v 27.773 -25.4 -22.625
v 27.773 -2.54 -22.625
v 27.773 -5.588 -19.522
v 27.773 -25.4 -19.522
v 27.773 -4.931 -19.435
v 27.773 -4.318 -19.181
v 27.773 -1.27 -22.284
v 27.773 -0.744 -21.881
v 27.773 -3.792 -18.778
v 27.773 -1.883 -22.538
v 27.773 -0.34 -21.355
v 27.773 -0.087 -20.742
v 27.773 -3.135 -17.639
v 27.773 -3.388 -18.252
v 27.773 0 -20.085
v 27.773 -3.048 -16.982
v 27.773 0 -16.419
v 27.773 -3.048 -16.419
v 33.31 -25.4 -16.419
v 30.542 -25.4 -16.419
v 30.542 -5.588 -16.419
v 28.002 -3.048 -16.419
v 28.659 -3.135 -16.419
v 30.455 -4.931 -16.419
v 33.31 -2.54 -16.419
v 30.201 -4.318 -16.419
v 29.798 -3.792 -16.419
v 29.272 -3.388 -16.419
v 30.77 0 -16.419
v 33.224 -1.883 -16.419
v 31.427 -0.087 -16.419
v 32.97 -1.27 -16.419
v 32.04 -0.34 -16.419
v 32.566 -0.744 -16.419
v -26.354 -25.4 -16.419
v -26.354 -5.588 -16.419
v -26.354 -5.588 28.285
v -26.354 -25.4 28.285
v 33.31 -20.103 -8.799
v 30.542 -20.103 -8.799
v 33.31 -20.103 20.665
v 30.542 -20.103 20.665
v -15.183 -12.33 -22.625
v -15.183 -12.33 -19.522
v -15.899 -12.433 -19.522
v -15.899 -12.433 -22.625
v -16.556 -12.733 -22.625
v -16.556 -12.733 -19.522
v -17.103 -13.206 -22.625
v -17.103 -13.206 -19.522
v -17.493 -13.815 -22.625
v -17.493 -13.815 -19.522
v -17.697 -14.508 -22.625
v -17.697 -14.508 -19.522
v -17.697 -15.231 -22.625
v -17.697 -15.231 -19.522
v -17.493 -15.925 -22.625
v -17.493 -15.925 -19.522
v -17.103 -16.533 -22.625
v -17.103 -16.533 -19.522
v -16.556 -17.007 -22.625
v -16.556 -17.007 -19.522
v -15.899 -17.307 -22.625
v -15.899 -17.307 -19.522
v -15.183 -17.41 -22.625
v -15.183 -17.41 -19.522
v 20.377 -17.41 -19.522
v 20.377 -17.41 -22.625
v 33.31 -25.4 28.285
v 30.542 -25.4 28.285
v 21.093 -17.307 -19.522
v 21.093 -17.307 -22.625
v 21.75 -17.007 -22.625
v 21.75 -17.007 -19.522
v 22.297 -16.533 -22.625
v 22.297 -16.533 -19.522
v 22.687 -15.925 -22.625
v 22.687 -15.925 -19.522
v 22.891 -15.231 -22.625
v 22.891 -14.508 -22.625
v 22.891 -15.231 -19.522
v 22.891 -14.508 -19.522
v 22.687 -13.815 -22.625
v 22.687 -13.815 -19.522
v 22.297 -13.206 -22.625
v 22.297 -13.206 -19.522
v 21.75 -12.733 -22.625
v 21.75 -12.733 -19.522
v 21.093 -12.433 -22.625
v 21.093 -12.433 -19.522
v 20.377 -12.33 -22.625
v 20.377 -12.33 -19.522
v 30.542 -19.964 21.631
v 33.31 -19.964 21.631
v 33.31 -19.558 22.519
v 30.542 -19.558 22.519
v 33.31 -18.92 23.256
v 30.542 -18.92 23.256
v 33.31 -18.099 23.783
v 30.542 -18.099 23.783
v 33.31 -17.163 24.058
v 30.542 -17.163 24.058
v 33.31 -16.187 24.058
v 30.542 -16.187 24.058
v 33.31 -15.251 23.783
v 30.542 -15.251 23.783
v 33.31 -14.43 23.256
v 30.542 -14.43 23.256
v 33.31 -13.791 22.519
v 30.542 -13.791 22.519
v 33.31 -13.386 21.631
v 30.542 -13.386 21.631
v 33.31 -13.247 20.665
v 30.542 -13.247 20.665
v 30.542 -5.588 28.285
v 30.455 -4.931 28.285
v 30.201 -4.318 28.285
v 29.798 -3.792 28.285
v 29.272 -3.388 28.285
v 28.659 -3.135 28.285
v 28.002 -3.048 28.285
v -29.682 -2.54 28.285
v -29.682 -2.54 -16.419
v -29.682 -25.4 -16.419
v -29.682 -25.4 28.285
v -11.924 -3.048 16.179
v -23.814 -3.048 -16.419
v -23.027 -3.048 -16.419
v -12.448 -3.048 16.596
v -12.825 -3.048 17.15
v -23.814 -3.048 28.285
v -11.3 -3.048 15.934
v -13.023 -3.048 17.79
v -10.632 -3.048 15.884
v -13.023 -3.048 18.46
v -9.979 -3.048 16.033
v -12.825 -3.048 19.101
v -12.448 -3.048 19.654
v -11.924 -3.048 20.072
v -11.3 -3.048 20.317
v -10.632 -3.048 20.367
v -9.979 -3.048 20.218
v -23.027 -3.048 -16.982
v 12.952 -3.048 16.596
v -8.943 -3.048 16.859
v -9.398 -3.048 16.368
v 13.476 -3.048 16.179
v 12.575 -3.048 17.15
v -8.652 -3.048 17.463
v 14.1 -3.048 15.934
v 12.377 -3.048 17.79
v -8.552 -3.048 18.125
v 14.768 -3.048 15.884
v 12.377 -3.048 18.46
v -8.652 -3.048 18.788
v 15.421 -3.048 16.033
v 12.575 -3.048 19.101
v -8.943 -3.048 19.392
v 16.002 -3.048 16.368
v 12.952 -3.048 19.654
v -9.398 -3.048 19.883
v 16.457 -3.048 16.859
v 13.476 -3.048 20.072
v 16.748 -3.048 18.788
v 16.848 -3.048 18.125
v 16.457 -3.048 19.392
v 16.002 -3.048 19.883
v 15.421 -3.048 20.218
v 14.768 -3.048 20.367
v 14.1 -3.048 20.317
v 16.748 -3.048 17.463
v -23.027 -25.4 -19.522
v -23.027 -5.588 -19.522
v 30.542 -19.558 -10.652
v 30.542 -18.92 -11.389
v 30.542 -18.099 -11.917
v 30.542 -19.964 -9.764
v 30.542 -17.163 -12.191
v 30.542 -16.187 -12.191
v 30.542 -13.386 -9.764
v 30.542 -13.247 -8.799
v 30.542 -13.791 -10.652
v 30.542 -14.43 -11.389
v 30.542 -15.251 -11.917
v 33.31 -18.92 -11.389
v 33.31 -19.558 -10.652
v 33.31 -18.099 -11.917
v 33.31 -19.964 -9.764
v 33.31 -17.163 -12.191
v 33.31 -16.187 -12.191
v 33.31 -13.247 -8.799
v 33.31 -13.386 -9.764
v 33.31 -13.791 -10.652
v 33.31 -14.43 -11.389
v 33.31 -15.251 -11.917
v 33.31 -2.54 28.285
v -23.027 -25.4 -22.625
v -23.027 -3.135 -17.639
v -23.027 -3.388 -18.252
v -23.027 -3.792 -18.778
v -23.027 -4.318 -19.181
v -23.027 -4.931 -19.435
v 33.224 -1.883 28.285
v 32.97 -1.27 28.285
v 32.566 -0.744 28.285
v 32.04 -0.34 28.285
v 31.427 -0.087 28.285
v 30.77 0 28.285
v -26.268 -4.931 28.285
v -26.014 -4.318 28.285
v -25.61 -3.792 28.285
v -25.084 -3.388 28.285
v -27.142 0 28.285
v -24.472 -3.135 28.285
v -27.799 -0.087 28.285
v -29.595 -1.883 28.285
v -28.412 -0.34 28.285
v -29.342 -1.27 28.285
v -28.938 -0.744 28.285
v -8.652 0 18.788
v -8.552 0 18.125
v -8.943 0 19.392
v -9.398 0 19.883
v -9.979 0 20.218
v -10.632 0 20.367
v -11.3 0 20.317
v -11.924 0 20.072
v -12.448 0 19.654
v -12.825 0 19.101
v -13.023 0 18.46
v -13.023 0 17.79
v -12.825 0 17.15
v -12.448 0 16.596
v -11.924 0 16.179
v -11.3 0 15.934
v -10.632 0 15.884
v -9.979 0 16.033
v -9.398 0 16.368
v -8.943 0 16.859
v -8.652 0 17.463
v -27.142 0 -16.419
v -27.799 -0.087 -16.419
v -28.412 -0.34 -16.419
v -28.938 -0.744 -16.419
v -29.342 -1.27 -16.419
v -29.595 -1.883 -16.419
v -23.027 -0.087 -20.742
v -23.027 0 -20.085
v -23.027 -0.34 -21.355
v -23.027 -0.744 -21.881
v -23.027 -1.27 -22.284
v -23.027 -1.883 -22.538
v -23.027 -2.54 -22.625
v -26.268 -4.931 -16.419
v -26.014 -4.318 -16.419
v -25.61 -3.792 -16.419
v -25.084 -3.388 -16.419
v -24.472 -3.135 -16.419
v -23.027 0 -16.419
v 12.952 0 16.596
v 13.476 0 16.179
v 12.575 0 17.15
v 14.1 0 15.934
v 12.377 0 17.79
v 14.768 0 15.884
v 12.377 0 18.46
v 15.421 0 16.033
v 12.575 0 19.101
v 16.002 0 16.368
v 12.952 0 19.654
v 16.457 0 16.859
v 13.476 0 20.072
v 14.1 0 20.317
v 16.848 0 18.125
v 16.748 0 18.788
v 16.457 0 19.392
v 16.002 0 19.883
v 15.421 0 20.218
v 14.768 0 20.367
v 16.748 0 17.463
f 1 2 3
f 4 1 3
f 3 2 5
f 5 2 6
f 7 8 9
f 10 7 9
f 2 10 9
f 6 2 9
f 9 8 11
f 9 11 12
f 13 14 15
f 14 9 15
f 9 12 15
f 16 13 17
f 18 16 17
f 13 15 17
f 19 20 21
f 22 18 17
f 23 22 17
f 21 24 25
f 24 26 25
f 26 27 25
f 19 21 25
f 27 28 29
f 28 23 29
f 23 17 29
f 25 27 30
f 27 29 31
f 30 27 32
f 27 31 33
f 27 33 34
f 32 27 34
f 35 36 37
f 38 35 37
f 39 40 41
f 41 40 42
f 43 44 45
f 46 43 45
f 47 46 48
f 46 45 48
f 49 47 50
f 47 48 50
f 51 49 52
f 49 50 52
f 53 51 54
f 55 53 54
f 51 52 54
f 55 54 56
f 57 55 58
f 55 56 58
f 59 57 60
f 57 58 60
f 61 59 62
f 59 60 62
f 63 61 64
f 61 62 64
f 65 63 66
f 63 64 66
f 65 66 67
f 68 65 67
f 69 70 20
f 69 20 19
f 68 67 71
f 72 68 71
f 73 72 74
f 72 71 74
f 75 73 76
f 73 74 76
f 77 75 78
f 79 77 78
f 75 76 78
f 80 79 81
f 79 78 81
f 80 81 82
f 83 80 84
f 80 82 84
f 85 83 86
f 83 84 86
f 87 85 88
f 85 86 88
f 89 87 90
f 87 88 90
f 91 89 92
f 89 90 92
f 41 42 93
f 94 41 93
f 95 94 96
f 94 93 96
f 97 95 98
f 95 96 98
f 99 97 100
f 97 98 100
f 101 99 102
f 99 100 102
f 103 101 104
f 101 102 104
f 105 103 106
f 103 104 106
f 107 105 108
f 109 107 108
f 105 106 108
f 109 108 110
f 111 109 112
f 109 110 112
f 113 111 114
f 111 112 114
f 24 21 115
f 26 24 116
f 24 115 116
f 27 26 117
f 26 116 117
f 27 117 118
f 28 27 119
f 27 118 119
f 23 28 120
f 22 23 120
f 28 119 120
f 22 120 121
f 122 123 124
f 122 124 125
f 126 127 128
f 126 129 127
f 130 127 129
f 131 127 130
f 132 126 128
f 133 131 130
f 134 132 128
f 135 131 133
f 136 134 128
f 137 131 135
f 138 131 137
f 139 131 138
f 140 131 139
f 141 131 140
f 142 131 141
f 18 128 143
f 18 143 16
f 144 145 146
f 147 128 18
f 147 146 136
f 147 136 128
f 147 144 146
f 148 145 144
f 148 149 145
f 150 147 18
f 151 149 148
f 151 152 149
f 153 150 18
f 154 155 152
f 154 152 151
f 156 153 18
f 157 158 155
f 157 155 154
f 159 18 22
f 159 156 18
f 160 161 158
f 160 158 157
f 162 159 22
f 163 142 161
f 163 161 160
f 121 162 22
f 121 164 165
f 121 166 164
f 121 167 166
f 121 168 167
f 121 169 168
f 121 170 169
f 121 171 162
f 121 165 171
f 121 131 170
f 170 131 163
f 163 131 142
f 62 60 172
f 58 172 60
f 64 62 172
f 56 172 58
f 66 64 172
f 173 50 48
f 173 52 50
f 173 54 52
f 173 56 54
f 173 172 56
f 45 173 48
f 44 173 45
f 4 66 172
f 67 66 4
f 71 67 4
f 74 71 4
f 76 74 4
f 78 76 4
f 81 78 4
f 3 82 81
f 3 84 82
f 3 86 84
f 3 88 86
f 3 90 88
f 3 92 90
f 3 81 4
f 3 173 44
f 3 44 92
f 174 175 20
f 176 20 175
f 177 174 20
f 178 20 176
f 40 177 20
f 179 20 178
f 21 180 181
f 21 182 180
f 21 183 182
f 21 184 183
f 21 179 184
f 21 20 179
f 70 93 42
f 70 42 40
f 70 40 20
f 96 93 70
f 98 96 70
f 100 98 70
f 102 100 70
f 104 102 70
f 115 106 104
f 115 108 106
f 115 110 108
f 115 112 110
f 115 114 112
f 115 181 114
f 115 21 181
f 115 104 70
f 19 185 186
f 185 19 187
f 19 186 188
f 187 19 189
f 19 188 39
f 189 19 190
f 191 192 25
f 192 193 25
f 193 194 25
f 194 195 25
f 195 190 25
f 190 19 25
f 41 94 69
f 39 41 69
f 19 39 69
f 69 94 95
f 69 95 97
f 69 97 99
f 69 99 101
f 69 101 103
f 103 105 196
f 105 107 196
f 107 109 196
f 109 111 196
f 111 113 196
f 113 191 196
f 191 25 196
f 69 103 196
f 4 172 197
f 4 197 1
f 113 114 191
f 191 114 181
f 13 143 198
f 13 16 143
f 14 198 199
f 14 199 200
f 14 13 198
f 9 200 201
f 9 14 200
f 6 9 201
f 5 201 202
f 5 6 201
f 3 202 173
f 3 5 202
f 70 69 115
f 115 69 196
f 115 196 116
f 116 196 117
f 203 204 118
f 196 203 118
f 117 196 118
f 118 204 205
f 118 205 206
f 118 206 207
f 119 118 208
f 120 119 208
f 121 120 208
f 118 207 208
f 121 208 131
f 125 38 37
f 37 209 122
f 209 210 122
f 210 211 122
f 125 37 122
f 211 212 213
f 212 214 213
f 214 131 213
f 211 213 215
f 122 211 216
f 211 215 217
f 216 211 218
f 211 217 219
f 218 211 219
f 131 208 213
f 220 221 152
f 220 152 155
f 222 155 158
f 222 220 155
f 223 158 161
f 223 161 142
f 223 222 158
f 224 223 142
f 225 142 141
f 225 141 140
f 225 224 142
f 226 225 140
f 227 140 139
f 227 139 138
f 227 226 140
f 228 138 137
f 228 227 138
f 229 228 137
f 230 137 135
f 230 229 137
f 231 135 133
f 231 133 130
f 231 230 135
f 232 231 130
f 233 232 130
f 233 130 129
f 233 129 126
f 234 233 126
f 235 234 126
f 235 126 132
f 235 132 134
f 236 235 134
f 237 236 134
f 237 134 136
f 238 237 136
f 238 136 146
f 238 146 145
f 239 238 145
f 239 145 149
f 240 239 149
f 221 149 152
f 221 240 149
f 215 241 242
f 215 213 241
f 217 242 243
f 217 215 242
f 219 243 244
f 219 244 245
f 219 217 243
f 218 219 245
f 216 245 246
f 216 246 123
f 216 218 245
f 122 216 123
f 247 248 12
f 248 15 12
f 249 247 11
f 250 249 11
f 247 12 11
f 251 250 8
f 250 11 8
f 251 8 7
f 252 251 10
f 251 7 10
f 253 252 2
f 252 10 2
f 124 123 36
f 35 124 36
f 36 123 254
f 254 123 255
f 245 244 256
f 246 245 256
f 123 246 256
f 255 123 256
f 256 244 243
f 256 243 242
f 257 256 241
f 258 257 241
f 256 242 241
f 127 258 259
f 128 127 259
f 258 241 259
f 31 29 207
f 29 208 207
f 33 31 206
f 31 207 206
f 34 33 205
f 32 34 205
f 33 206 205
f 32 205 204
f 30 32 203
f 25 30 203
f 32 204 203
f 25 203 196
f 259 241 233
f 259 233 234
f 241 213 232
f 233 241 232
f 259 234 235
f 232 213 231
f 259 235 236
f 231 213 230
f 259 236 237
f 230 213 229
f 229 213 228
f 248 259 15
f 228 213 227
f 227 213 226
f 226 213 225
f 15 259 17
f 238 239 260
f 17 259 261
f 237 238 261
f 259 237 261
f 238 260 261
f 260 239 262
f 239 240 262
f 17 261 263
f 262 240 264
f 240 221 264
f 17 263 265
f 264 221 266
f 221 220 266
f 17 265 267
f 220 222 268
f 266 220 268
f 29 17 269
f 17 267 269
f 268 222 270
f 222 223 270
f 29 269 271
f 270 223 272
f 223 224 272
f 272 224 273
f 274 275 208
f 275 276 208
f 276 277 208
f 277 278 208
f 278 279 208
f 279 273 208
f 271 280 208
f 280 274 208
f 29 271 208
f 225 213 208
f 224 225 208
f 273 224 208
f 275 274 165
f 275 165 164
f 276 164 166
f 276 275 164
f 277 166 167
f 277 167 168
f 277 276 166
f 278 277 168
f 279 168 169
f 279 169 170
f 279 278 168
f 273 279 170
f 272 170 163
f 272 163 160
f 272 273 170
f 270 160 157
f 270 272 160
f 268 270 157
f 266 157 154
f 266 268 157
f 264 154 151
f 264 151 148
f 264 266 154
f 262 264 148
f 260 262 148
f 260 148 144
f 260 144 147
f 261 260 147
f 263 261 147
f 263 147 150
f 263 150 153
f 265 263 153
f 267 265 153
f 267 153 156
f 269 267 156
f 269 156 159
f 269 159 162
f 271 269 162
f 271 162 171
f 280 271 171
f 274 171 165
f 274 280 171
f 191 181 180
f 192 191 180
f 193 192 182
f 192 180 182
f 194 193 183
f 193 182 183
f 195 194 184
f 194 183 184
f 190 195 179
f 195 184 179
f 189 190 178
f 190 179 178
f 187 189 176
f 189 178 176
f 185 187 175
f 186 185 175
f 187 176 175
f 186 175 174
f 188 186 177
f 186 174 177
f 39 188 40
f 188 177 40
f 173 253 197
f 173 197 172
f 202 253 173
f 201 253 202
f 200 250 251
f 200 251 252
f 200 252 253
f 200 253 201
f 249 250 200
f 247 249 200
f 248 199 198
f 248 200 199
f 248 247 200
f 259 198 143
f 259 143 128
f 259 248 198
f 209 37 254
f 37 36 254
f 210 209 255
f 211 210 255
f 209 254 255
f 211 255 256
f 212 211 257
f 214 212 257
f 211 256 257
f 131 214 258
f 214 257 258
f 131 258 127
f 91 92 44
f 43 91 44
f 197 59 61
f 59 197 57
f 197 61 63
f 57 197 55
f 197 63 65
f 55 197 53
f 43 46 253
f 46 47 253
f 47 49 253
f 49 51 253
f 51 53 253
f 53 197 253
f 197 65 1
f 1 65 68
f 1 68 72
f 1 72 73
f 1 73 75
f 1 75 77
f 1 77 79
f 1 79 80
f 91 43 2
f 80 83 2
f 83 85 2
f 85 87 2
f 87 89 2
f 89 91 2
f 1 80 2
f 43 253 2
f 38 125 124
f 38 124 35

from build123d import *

# Parameters (mm, degrees)
F0_R     = 2.2479
F1_DEPTH = 3.048
F0_W     = 50.8
F0_H     = 3.1029520094
F0_W_2   = 3.3275114092
F0_H_2   = 44.704
F0_W_3   = 2.7684885908
F2_DEPTH = 25.4
F4_R     = 2.54
F6_DEPTH = 25.4
F7_DEPTH = 25.4


with BuildPart() as f1:
    # F0 (on Front) → F1 (new body)
    with BuildSketch(Plane.XZ):
        Polygon((30.5415683826, 28.2853763875), (-26.3544316174, 28.2853763875), (-26.3544316174, -16.4186236125), (-23.0269202082, -16.4186236125), (-23.0269202082, -19.5215756219), (27.7730797918, -19.5215756219), (27.7730797918, -16.4186236125), (30.5415683826, -16.4186236125), align=None)
        with Locations((-10.7998287971, 18.1253763875)):
            Circle(F0_R, mode=Mode.SUBTRACT)
        with Locations((14.6001712029, 18.1253763875)):
            Circle(F0_R, mode=Mode.SUBTRACT)
    extrude(amount=F1_DEPTH)

    # F0 (on Front) → F2 (join)
    with BuildSketch(Plane.XZ):
        with Locations((2.3730797918, -21.0730516266)):
            Rectangle(F0_W, F0_H)
        with Locations((-28.018187322, 5.9333763875)):
            Rectangle(F0_W_2, F0_H_2)
        with Locations((31.925812678, 5.9333763875)):
            Rectangle(F0_W_3, F0_H_2)
    extrude(amount=F2_DEPTH)

    # F4
    f4_edges = [f1.edges().sort_by_distance(p)[0] for p in [
        (2.37308, -3.048, -19.521576),
        (2.37308, 0, -22.624528),
        (33.310057, 0, 5.933376),
        (30.541568, -3.048, 5.933376),
        (-26.354432, -3.048, 5.933376),
        (-29.681943, 0, 5.933376),
    ]]
    fillet(f4_edges, radius=F4_R)

    # F5 (on face) → F6 (cut)
    with BuildSketch(Plane(origin=(30.5415683826, 0, 0), x_dir=(0, -1, 0), z_dir=(-1, 0, 0))):
        with BuildLine():
            ThreePointArc((20.1026303179, 20.6653763875), (16.6749283671, 24.0930783383), (13.2472264163, 20.6653763875))
            Line((13.2472264163, 20.6653763875), (13.2472264163, -8.7986236125))
            ThreePointArc((13.2472264163, -8.7986236125), (16.6749283671, -12.2263255633), (20.1026303179, -8.7986236125))
            Line((20.1026303179, -8.7986236125), (20.1026303179, 20.6653763875))
        make_face()
    extrude(amount=-F6_DEPTH, mode=Mode.SUBTRACT)

    # F3 (on face) → F7 (cut)
    with BuildSketch(Plane.XY.offset(-19.5215756219)):
        with BuildLine():
            ThreePointArc((-15.1830099327, -12.3297252466), (-17.7230099327, -14.8697252466), (-15.1830099327, -17.4097252466))
            Line((-15.1830099327, -17.4097252466), (20.3769900673, -17.4097252466))
            ThreePointArc((20.3769900673, -17.4097252466), (22.9169900673, -14.8697252466), (20.3769900673, -12.3297252466))
            Line((20.3769900673, -12.3297252466), (-15.1830099327, -12.3297252466))
        make_face()
    extrude(amount=-F7_DEPTH, mode=Mode.SUBTRACT)


solid = f1.part
